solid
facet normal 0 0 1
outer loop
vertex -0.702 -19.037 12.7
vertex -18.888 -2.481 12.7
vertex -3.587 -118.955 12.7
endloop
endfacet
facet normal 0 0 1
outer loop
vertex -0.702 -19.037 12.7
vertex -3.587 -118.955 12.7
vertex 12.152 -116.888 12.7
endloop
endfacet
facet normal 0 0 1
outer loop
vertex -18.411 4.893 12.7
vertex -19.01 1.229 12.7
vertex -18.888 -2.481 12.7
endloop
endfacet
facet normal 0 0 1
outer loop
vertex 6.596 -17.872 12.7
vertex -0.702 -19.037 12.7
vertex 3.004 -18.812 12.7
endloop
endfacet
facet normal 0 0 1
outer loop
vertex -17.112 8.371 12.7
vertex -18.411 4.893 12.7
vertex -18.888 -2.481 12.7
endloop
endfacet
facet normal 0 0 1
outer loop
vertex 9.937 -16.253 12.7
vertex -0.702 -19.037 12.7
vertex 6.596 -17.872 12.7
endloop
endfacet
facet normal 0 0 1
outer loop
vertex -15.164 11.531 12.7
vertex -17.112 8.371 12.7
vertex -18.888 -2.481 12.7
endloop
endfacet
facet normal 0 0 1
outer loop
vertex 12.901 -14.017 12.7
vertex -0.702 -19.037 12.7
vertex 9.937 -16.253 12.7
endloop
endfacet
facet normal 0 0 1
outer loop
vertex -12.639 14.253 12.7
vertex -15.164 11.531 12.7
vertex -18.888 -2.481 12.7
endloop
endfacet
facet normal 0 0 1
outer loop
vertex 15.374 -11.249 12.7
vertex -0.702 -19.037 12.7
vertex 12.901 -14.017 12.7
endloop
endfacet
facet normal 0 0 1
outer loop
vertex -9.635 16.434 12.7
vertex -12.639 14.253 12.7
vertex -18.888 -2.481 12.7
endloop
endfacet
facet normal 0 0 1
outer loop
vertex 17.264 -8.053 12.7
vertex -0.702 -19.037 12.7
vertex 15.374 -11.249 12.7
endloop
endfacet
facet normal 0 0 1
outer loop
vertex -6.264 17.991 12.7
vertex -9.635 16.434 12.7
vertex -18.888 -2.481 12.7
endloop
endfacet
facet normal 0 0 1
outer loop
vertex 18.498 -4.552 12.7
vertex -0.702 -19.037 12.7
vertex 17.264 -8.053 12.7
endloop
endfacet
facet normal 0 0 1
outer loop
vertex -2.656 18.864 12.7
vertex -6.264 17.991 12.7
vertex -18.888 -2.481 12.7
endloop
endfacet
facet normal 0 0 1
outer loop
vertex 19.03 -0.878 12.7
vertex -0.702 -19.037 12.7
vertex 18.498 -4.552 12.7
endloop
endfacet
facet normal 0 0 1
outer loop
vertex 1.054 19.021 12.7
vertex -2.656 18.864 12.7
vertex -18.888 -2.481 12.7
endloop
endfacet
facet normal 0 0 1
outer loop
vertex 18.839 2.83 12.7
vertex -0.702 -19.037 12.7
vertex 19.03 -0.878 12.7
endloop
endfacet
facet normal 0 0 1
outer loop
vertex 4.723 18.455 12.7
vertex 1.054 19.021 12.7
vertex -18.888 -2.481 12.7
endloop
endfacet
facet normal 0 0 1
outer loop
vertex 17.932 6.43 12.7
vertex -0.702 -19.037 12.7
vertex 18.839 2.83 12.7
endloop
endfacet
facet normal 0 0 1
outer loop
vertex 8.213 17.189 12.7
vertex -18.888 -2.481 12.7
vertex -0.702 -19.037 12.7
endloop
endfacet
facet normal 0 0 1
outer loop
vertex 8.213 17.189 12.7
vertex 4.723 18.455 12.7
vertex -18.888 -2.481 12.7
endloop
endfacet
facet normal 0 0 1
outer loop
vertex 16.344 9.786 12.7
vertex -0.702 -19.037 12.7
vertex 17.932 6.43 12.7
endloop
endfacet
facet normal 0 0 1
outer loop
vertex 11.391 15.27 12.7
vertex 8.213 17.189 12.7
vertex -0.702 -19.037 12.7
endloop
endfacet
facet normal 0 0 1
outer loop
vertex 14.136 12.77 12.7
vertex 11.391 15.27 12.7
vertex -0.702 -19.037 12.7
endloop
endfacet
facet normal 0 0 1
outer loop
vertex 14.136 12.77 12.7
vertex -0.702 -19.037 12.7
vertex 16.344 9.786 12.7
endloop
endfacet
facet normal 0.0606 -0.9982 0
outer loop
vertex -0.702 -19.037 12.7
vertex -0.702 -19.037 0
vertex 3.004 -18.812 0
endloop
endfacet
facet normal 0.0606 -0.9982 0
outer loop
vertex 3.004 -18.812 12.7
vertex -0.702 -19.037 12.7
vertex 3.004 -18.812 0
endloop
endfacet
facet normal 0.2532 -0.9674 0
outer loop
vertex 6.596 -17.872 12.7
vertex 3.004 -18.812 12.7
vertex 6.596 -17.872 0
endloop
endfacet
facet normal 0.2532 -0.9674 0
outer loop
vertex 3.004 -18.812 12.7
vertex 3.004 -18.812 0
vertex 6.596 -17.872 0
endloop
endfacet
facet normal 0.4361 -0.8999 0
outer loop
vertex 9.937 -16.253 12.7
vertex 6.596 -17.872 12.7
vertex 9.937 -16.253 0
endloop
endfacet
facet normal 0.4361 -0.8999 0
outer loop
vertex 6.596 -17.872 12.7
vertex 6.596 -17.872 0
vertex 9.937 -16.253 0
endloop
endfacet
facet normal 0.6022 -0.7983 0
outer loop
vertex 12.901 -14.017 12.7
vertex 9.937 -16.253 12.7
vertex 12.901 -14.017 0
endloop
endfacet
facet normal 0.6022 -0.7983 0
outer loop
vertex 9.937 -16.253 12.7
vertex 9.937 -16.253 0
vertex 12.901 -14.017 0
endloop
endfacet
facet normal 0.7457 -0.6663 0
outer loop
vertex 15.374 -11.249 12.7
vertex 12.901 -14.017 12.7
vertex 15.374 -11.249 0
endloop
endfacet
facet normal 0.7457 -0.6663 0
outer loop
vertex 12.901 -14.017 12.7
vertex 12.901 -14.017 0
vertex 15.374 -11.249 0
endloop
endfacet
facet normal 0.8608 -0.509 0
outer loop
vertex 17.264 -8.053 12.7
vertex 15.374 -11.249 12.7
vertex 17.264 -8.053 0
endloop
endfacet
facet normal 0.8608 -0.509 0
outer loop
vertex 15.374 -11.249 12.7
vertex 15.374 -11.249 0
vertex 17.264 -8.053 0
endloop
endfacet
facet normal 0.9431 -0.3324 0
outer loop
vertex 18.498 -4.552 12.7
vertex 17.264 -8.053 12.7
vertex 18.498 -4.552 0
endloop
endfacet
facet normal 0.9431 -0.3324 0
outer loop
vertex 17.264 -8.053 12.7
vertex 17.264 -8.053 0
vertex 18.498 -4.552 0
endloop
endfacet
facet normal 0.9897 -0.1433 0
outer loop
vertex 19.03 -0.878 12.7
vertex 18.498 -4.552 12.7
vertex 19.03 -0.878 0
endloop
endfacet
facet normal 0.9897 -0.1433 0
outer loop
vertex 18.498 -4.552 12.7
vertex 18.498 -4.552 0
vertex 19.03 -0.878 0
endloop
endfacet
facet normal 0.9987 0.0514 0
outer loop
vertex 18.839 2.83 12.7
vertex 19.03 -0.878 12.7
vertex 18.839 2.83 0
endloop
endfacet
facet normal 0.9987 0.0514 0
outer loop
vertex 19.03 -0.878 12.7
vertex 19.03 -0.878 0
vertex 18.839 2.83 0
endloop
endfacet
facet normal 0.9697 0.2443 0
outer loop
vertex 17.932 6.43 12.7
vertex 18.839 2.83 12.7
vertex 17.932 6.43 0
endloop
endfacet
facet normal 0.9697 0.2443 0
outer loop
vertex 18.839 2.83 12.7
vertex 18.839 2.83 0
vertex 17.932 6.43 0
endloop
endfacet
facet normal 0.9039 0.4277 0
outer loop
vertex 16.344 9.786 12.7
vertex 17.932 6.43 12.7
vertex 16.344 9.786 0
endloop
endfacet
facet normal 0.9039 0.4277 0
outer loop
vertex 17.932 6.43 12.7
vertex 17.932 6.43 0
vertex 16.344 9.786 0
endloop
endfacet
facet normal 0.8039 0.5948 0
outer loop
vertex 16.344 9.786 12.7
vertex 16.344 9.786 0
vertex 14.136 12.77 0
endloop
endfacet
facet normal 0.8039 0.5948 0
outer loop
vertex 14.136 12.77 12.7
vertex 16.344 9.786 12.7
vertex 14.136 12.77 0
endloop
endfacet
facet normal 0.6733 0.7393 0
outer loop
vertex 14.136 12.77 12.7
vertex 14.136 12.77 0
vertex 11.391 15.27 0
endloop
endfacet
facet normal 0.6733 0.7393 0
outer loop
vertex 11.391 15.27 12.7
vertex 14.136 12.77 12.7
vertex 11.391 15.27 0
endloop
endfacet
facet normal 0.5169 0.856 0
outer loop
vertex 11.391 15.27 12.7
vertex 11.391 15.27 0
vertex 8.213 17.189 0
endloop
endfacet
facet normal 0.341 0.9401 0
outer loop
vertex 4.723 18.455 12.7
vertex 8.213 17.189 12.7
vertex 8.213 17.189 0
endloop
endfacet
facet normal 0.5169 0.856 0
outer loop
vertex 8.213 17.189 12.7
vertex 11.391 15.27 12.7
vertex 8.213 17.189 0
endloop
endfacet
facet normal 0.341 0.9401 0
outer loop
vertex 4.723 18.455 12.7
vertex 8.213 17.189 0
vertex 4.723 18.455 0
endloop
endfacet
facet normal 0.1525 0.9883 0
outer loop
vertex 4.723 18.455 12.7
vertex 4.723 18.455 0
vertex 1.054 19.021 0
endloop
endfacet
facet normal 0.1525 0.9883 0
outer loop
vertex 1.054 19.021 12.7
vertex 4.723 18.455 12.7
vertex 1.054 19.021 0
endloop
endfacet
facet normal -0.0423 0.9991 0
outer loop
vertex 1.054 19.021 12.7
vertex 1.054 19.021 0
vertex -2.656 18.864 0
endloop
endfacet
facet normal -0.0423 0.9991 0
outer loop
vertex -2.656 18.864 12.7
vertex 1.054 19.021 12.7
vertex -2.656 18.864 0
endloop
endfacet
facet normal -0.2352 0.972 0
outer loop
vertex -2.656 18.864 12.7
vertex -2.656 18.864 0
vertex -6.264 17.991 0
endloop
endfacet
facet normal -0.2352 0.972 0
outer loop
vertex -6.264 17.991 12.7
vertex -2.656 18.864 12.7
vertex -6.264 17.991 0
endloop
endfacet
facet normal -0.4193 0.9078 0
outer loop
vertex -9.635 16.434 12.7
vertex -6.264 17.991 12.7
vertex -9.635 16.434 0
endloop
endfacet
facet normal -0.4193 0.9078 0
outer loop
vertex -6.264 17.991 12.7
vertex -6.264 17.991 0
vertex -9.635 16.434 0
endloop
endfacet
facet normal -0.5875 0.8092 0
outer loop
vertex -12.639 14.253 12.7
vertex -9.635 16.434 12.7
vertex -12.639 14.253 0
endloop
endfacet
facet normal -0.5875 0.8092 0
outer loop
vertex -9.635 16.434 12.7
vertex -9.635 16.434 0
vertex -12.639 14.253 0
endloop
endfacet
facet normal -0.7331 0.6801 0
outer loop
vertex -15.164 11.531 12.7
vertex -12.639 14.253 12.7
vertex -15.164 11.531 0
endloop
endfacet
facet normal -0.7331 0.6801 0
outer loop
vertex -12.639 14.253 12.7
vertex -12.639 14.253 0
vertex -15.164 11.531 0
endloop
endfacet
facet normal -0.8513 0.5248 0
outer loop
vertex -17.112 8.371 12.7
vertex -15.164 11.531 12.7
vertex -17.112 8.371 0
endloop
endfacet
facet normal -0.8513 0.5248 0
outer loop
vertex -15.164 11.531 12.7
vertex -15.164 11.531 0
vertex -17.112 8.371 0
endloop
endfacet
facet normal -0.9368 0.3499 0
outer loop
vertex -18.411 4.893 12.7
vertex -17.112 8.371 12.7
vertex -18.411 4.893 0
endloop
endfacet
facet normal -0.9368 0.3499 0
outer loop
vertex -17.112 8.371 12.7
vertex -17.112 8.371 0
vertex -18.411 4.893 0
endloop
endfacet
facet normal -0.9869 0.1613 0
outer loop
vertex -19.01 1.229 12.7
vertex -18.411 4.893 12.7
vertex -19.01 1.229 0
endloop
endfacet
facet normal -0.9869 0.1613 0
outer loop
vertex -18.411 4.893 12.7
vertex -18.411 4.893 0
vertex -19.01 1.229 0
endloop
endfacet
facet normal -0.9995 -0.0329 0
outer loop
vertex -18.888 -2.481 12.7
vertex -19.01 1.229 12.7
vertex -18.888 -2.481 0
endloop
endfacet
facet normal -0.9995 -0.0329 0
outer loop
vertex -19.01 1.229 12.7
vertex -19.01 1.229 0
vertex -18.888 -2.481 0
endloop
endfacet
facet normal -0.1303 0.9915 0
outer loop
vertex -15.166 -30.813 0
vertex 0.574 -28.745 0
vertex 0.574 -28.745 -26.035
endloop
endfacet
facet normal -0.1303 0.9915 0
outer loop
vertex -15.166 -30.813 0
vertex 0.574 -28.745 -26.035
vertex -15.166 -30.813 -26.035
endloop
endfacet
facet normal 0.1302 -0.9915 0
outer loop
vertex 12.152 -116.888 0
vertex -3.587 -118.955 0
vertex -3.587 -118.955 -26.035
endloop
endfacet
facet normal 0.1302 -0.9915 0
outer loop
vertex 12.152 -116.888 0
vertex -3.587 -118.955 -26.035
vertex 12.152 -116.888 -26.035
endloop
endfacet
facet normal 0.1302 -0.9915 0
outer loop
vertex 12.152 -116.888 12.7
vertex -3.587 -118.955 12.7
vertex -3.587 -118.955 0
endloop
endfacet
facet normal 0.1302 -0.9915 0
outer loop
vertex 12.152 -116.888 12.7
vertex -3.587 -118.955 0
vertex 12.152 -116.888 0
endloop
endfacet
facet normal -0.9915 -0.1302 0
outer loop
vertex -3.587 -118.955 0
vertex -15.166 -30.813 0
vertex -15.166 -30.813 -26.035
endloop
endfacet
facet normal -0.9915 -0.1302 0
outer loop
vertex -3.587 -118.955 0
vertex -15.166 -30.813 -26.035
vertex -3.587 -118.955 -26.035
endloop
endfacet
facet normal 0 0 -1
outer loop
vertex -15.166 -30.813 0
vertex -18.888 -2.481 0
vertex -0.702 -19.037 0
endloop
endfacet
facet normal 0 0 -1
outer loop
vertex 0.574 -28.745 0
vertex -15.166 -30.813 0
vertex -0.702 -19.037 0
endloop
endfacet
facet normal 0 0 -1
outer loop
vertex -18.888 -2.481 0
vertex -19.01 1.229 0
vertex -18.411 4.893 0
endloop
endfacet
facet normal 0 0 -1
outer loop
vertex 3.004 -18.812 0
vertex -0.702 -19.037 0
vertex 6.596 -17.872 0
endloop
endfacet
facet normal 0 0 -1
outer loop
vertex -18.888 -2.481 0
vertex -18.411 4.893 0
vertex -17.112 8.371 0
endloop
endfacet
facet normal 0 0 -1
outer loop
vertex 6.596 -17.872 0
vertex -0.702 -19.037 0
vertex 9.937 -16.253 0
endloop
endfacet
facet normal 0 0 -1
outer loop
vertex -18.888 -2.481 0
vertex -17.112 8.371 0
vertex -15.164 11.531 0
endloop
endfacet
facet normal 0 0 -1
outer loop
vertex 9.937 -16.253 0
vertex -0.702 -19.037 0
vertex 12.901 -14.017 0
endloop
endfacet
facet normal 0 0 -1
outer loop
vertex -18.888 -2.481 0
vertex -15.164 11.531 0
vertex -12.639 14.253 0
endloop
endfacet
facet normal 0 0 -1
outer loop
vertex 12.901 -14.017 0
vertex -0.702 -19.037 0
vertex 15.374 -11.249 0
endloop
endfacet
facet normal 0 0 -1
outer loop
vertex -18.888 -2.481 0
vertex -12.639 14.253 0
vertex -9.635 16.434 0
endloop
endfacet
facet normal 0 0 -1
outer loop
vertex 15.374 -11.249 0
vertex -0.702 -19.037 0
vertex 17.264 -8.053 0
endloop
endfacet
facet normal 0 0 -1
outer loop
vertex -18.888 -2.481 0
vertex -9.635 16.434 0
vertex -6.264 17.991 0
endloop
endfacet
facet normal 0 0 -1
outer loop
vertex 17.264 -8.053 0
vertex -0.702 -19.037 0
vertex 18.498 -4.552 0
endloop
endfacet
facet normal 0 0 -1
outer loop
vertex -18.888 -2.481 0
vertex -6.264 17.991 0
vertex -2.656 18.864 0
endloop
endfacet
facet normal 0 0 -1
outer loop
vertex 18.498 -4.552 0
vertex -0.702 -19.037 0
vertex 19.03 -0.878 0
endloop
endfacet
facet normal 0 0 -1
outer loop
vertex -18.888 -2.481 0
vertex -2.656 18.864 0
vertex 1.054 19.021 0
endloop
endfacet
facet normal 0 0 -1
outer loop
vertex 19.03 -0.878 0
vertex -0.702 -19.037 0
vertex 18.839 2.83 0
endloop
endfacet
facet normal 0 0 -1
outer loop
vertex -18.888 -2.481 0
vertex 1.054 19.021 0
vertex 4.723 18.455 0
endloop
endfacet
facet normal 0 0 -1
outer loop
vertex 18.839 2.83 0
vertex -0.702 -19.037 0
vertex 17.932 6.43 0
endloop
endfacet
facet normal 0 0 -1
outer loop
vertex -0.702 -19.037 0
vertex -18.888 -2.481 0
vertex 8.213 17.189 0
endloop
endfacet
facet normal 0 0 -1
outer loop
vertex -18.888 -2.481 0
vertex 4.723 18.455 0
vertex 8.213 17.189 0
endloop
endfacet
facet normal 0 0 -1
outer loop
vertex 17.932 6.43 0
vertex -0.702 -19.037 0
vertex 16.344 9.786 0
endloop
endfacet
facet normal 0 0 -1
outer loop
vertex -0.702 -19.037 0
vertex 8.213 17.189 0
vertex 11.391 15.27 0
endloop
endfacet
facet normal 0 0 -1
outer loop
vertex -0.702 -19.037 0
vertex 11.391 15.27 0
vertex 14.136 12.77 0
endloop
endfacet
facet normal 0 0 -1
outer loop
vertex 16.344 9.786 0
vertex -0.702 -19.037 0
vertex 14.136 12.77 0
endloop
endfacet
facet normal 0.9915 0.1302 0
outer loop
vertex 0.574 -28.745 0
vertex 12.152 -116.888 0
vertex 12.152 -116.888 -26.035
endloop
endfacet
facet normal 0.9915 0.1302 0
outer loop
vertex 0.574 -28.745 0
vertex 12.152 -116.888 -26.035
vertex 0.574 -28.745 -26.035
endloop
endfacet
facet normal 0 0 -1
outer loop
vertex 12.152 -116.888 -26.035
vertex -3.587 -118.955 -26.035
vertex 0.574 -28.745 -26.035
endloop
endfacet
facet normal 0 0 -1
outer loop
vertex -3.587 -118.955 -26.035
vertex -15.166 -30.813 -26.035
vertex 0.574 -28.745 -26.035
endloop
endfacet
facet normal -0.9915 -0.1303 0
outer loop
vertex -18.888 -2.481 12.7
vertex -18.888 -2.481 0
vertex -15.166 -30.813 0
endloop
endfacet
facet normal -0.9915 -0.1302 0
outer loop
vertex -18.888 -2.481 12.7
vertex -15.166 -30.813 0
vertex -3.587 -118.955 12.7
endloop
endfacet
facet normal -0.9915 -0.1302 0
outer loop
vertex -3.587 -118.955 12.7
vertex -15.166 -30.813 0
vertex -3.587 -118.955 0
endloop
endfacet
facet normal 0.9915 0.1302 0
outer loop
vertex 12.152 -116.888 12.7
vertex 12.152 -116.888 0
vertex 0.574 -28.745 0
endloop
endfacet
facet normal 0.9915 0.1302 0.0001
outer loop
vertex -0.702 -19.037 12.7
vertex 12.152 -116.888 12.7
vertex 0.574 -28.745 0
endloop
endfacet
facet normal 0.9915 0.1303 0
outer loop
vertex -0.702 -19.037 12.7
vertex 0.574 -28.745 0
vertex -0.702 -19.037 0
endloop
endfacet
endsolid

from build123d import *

# Parameters (mm, degrees)
SKETCH1_R           = 19.05
BOSS_EXTRUDE1_DEPTH = 12.7
BOSS_EXTRUDE2_START = -12.7
BOSS_EXTRUDE2_DEPTH = 12.7
BOSS_EXTRUDE3_DEPTH = 26.035


with BuildPart() as part:
    # Sketch1 → Boss-Extrude1 (new body)
    with BuildSketch(Plane.XY):
        Circle(SKETCH1_R)
    extrude(amount=BOSS_EXTRUDE1_DEPTH)

    # Sketch2 → Boss-Extrude2 (add)
    with BuildSketch(Plane.XY.offset(12.7).offset(BOSS_EXTRUDE2_START)):
        with BuildLine():
            Line((-18.887735318, -2.481119615), (-3.587497693, -118.955487411))
            Line((-3.587497693, -118.955487411), (12.152281739, -116.887887732))
            Line((12.152281739, -116.887887732), (-0.701538954, -19.037078113))
            ThreePointArc((-0.701538954, -19.037078113), (-12.824190309, -14.08696713), (-18.887735318, -2.481119615))
        make_face()
    extrude(amount=BOSS_EXTRUDE2_DEPTH)

    # Sketch3 → Boss-Extrude3 (add)
    with BuildSketch(Plane(origin=(0, 0, 0), x_dir=(-1, 0, 0), z_dir=(0, 0, -1))):
        Polygon((3.587497693, -118.955487411), (-12.152281739, -116.887887732), (-0.573723536, -28.745122913), (15.166055896, -30.812722592), align=None)
    extrude(amount=BOSS_EXTRUDE3_DEPTH)


solid = part.part
